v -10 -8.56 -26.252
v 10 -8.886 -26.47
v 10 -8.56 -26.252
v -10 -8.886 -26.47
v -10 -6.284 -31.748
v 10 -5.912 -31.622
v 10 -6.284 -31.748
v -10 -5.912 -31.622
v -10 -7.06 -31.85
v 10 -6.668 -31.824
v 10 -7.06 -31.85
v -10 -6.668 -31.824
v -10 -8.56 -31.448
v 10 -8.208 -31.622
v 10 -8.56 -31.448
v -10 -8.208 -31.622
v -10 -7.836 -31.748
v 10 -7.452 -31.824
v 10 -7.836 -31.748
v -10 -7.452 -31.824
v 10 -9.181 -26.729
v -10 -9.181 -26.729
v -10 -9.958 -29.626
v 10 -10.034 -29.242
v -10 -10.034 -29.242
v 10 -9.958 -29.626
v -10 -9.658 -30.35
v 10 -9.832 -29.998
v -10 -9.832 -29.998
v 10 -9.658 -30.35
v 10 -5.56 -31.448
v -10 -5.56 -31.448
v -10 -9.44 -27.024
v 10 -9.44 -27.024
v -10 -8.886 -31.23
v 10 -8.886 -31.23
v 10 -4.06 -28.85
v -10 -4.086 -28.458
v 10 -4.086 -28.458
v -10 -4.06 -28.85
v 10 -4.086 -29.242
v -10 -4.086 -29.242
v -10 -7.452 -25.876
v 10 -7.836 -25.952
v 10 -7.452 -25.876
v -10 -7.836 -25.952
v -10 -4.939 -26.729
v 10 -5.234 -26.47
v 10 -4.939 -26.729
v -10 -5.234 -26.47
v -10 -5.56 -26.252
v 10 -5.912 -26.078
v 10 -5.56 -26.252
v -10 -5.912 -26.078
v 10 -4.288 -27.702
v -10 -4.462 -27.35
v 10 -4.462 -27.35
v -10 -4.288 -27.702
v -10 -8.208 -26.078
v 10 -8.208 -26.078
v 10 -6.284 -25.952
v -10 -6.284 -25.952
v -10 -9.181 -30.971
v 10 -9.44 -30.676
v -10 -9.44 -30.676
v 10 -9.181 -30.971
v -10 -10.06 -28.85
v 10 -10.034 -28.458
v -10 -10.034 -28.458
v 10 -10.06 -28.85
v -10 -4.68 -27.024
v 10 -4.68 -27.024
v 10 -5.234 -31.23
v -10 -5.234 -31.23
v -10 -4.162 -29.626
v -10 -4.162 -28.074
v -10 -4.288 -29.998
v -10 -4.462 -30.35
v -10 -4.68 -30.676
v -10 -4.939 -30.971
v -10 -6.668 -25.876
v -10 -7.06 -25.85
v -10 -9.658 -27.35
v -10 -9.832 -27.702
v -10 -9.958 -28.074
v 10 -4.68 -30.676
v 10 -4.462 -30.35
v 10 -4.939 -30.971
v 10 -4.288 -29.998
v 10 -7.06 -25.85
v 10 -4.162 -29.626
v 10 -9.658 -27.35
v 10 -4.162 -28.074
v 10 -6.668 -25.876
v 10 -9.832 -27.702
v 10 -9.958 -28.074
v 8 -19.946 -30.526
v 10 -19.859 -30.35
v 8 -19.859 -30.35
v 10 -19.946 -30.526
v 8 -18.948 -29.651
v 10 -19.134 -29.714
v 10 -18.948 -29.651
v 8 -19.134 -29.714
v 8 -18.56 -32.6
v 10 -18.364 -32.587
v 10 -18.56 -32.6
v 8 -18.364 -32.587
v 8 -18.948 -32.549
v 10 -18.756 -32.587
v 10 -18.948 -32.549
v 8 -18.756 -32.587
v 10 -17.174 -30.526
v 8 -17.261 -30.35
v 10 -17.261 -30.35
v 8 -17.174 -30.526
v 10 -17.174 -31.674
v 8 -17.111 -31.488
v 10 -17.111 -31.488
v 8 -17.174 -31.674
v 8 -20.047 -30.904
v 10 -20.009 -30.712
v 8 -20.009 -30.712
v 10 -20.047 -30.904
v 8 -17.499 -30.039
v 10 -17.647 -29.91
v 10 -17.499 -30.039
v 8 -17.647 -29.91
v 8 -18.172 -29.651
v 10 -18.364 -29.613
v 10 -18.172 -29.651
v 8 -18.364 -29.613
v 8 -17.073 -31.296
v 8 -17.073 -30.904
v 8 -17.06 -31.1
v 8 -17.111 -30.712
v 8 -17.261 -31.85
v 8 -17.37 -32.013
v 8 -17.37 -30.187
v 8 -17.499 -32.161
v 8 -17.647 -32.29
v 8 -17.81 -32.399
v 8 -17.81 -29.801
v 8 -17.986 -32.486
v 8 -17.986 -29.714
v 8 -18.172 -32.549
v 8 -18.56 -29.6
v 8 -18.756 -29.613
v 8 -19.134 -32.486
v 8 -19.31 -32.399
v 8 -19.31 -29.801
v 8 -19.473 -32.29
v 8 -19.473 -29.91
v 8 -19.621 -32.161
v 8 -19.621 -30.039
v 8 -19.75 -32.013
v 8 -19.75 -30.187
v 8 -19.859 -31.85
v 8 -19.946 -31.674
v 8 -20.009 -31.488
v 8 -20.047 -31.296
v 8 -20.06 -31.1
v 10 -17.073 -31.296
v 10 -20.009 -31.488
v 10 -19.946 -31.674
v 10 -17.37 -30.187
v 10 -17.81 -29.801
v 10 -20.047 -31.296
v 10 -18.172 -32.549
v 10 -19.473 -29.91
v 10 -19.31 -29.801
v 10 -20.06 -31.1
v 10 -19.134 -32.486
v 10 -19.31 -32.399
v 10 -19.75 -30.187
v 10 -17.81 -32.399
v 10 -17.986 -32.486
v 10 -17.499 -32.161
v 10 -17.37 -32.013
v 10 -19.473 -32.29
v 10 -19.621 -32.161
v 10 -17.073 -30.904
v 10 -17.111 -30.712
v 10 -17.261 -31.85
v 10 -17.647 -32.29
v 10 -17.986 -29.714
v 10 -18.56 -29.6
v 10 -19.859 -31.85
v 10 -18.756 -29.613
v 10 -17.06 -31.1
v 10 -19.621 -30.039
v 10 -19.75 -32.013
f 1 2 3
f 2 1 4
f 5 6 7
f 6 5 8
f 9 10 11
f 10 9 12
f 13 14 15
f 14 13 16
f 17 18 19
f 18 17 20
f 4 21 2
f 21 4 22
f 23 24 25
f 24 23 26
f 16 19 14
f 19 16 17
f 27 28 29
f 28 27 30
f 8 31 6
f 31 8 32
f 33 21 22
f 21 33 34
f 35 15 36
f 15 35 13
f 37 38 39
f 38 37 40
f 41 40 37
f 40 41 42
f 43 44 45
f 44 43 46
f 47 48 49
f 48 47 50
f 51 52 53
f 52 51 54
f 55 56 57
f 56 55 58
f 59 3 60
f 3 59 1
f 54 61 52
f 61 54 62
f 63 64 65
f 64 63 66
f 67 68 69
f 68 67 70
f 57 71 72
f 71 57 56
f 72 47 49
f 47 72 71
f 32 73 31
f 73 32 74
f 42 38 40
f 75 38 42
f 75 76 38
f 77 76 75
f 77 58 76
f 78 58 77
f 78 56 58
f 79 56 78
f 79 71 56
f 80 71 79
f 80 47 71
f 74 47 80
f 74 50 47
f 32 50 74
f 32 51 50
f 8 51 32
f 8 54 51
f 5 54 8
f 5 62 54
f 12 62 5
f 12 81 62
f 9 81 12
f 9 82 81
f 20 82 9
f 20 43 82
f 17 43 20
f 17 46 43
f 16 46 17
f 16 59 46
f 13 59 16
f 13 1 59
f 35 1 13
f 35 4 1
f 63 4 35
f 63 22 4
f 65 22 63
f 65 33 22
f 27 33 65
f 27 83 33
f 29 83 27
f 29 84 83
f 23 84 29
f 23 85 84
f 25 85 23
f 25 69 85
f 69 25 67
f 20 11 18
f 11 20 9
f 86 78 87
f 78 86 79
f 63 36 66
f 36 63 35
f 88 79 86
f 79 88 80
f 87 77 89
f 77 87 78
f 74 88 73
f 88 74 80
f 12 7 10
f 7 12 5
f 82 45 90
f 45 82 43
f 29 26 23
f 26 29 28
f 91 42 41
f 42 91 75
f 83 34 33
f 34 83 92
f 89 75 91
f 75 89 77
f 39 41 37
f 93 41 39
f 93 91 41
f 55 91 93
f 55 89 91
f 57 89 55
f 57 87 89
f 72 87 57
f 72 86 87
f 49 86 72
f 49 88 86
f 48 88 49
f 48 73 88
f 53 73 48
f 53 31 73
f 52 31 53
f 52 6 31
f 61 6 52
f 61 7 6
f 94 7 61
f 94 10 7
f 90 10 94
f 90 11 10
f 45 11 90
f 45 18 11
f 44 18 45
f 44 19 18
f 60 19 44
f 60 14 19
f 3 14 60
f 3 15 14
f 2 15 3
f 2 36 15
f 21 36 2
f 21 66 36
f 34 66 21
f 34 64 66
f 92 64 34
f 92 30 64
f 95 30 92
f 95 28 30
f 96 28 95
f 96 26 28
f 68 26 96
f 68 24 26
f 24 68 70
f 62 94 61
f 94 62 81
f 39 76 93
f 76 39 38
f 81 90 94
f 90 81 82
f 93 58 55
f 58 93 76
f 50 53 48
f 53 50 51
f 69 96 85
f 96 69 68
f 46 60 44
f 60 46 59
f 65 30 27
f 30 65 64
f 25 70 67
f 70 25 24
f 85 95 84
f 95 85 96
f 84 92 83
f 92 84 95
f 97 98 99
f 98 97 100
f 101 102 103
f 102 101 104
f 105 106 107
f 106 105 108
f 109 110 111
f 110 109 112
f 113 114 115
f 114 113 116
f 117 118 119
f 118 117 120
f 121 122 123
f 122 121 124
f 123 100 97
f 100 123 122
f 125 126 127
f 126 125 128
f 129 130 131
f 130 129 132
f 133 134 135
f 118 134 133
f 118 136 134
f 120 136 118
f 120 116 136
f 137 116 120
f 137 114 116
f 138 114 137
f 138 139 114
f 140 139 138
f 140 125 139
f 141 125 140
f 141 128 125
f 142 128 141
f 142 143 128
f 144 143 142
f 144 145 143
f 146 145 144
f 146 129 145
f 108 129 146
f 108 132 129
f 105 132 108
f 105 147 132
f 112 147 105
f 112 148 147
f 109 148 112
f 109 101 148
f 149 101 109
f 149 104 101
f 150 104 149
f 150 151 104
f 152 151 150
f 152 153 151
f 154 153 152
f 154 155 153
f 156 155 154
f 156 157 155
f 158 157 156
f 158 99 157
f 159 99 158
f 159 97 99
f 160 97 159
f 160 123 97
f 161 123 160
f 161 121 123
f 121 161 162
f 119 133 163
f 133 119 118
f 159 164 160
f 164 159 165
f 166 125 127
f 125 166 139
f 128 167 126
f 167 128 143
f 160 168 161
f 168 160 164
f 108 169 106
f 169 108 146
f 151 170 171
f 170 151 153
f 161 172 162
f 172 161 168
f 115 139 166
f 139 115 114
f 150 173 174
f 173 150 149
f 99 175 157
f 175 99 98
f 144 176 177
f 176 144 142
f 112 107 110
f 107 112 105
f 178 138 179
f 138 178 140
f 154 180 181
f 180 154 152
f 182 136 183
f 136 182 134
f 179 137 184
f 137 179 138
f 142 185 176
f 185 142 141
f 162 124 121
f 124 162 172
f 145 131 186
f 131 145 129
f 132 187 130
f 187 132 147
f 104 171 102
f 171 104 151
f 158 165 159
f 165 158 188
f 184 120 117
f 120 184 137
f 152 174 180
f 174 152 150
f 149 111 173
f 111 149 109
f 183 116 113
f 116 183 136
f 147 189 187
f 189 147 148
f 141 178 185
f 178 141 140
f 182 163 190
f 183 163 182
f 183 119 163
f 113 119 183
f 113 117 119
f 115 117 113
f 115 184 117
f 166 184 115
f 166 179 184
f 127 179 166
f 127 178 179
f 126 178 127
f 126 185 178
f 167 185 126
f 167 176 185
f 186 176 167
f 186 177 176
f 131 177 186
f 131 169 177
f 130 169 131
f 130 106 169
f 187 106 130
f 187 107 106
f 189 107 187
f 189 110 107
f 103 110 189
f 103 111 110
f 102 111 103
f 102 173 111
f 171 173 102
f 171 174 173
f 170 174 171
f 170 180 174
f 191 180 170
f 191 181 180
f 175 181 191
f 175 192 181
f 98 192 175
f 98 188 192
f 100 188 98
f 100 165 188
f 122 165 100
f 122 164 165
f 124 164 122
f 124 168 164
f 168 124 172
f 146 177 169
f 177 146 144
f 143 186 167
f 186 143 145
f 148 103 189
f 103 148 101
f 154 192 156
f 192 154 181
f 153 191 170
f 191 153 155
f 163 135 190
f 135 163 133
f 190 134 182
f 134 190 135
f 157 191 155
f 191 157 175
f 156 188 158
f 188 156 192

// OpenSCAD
// file: lib/v6.scad
// Simplified E3D V6, placed according to the Igneus body's hotend seat.
// The nozzle tip ends up ~2 mm below the ducts (adjustable with the height slot).
$fn = 48;
v6_axis = [0, -14.06];
v6_top = 21.7;                       // top of the groove mount
v6_hs_bottom = v6_top - 42.7;        // bottom of the heatsink
v6_block_top = v6_hs_bottom - 2.1;   // top of the heater block

module v6_heatsink() translate([v6_axis[0], v6_axis[1], 0]) {
    translate([0, 0, v6_top - 3.7]) cylinder(d = 16, h = 3.7);
    translate([0, 0, v6_top - 9.7]) cylinder(d = 12, h = 6 + 0.01);
    translate([0, 0, v6_top - 12.7]) cylinder(d = 16, h = 3 + 0.01);
    translate([0, 0, v6_hs_bottom]) cylinder(d = 10, h = 30 + 0.01);
    for (i = [0 : 10]) translate([0, 0, v6_top - 12.7 - 2.2 - i * 2.55]) cylinder(d = 22.3, h = 1.1);
    translate([0, 0, v6_hs_bottom]) cylinder(d = 16, h = 1.2);
    translate([0, 0, v6_block_top - 0.01]) cylinder(d = 7, h = 2.2);   // heatbreak
}
module v6_heater_block() translate([v6_axis[0], v6_axis[1], 0])
    translate([-8, -8, v6_block_top - 11.5]) cube([16, 20, 11.5]);
module v6_heater_cartridge() translate([v6_axis[0], v6_axis[1], 0]) {
    translate([-10, 7, v6_block_top - 5.75]) rotate([0, 90, 0]) cylinder(d = 6, h = 20);
    translate([8, -4.5, v6_block_top - 8]) rotate([0, 90, 0]) cylinder(d = 3, h = 2);   // thermistor
}
module v6_nozzle() translate([v6_axis[0], v6_axis[1], 0]) {
    translate([0, 0, v6_block_top - 11.5 - 3]) cylinder(d = 8.08, h = 3 + 0.01, $fn = 6);
    translate([0, 0, v6_block_top - 11.5 - 5]) cylinder(d1 = 1, d2 = 5, h = 2 + 0.01);
}
// main file
// color: #8f949a
// material: metal
// PREVIEW ONLY: heater cartridge and thermistor.
include <lib/v6.scad>
v6_heater_cartridge();
